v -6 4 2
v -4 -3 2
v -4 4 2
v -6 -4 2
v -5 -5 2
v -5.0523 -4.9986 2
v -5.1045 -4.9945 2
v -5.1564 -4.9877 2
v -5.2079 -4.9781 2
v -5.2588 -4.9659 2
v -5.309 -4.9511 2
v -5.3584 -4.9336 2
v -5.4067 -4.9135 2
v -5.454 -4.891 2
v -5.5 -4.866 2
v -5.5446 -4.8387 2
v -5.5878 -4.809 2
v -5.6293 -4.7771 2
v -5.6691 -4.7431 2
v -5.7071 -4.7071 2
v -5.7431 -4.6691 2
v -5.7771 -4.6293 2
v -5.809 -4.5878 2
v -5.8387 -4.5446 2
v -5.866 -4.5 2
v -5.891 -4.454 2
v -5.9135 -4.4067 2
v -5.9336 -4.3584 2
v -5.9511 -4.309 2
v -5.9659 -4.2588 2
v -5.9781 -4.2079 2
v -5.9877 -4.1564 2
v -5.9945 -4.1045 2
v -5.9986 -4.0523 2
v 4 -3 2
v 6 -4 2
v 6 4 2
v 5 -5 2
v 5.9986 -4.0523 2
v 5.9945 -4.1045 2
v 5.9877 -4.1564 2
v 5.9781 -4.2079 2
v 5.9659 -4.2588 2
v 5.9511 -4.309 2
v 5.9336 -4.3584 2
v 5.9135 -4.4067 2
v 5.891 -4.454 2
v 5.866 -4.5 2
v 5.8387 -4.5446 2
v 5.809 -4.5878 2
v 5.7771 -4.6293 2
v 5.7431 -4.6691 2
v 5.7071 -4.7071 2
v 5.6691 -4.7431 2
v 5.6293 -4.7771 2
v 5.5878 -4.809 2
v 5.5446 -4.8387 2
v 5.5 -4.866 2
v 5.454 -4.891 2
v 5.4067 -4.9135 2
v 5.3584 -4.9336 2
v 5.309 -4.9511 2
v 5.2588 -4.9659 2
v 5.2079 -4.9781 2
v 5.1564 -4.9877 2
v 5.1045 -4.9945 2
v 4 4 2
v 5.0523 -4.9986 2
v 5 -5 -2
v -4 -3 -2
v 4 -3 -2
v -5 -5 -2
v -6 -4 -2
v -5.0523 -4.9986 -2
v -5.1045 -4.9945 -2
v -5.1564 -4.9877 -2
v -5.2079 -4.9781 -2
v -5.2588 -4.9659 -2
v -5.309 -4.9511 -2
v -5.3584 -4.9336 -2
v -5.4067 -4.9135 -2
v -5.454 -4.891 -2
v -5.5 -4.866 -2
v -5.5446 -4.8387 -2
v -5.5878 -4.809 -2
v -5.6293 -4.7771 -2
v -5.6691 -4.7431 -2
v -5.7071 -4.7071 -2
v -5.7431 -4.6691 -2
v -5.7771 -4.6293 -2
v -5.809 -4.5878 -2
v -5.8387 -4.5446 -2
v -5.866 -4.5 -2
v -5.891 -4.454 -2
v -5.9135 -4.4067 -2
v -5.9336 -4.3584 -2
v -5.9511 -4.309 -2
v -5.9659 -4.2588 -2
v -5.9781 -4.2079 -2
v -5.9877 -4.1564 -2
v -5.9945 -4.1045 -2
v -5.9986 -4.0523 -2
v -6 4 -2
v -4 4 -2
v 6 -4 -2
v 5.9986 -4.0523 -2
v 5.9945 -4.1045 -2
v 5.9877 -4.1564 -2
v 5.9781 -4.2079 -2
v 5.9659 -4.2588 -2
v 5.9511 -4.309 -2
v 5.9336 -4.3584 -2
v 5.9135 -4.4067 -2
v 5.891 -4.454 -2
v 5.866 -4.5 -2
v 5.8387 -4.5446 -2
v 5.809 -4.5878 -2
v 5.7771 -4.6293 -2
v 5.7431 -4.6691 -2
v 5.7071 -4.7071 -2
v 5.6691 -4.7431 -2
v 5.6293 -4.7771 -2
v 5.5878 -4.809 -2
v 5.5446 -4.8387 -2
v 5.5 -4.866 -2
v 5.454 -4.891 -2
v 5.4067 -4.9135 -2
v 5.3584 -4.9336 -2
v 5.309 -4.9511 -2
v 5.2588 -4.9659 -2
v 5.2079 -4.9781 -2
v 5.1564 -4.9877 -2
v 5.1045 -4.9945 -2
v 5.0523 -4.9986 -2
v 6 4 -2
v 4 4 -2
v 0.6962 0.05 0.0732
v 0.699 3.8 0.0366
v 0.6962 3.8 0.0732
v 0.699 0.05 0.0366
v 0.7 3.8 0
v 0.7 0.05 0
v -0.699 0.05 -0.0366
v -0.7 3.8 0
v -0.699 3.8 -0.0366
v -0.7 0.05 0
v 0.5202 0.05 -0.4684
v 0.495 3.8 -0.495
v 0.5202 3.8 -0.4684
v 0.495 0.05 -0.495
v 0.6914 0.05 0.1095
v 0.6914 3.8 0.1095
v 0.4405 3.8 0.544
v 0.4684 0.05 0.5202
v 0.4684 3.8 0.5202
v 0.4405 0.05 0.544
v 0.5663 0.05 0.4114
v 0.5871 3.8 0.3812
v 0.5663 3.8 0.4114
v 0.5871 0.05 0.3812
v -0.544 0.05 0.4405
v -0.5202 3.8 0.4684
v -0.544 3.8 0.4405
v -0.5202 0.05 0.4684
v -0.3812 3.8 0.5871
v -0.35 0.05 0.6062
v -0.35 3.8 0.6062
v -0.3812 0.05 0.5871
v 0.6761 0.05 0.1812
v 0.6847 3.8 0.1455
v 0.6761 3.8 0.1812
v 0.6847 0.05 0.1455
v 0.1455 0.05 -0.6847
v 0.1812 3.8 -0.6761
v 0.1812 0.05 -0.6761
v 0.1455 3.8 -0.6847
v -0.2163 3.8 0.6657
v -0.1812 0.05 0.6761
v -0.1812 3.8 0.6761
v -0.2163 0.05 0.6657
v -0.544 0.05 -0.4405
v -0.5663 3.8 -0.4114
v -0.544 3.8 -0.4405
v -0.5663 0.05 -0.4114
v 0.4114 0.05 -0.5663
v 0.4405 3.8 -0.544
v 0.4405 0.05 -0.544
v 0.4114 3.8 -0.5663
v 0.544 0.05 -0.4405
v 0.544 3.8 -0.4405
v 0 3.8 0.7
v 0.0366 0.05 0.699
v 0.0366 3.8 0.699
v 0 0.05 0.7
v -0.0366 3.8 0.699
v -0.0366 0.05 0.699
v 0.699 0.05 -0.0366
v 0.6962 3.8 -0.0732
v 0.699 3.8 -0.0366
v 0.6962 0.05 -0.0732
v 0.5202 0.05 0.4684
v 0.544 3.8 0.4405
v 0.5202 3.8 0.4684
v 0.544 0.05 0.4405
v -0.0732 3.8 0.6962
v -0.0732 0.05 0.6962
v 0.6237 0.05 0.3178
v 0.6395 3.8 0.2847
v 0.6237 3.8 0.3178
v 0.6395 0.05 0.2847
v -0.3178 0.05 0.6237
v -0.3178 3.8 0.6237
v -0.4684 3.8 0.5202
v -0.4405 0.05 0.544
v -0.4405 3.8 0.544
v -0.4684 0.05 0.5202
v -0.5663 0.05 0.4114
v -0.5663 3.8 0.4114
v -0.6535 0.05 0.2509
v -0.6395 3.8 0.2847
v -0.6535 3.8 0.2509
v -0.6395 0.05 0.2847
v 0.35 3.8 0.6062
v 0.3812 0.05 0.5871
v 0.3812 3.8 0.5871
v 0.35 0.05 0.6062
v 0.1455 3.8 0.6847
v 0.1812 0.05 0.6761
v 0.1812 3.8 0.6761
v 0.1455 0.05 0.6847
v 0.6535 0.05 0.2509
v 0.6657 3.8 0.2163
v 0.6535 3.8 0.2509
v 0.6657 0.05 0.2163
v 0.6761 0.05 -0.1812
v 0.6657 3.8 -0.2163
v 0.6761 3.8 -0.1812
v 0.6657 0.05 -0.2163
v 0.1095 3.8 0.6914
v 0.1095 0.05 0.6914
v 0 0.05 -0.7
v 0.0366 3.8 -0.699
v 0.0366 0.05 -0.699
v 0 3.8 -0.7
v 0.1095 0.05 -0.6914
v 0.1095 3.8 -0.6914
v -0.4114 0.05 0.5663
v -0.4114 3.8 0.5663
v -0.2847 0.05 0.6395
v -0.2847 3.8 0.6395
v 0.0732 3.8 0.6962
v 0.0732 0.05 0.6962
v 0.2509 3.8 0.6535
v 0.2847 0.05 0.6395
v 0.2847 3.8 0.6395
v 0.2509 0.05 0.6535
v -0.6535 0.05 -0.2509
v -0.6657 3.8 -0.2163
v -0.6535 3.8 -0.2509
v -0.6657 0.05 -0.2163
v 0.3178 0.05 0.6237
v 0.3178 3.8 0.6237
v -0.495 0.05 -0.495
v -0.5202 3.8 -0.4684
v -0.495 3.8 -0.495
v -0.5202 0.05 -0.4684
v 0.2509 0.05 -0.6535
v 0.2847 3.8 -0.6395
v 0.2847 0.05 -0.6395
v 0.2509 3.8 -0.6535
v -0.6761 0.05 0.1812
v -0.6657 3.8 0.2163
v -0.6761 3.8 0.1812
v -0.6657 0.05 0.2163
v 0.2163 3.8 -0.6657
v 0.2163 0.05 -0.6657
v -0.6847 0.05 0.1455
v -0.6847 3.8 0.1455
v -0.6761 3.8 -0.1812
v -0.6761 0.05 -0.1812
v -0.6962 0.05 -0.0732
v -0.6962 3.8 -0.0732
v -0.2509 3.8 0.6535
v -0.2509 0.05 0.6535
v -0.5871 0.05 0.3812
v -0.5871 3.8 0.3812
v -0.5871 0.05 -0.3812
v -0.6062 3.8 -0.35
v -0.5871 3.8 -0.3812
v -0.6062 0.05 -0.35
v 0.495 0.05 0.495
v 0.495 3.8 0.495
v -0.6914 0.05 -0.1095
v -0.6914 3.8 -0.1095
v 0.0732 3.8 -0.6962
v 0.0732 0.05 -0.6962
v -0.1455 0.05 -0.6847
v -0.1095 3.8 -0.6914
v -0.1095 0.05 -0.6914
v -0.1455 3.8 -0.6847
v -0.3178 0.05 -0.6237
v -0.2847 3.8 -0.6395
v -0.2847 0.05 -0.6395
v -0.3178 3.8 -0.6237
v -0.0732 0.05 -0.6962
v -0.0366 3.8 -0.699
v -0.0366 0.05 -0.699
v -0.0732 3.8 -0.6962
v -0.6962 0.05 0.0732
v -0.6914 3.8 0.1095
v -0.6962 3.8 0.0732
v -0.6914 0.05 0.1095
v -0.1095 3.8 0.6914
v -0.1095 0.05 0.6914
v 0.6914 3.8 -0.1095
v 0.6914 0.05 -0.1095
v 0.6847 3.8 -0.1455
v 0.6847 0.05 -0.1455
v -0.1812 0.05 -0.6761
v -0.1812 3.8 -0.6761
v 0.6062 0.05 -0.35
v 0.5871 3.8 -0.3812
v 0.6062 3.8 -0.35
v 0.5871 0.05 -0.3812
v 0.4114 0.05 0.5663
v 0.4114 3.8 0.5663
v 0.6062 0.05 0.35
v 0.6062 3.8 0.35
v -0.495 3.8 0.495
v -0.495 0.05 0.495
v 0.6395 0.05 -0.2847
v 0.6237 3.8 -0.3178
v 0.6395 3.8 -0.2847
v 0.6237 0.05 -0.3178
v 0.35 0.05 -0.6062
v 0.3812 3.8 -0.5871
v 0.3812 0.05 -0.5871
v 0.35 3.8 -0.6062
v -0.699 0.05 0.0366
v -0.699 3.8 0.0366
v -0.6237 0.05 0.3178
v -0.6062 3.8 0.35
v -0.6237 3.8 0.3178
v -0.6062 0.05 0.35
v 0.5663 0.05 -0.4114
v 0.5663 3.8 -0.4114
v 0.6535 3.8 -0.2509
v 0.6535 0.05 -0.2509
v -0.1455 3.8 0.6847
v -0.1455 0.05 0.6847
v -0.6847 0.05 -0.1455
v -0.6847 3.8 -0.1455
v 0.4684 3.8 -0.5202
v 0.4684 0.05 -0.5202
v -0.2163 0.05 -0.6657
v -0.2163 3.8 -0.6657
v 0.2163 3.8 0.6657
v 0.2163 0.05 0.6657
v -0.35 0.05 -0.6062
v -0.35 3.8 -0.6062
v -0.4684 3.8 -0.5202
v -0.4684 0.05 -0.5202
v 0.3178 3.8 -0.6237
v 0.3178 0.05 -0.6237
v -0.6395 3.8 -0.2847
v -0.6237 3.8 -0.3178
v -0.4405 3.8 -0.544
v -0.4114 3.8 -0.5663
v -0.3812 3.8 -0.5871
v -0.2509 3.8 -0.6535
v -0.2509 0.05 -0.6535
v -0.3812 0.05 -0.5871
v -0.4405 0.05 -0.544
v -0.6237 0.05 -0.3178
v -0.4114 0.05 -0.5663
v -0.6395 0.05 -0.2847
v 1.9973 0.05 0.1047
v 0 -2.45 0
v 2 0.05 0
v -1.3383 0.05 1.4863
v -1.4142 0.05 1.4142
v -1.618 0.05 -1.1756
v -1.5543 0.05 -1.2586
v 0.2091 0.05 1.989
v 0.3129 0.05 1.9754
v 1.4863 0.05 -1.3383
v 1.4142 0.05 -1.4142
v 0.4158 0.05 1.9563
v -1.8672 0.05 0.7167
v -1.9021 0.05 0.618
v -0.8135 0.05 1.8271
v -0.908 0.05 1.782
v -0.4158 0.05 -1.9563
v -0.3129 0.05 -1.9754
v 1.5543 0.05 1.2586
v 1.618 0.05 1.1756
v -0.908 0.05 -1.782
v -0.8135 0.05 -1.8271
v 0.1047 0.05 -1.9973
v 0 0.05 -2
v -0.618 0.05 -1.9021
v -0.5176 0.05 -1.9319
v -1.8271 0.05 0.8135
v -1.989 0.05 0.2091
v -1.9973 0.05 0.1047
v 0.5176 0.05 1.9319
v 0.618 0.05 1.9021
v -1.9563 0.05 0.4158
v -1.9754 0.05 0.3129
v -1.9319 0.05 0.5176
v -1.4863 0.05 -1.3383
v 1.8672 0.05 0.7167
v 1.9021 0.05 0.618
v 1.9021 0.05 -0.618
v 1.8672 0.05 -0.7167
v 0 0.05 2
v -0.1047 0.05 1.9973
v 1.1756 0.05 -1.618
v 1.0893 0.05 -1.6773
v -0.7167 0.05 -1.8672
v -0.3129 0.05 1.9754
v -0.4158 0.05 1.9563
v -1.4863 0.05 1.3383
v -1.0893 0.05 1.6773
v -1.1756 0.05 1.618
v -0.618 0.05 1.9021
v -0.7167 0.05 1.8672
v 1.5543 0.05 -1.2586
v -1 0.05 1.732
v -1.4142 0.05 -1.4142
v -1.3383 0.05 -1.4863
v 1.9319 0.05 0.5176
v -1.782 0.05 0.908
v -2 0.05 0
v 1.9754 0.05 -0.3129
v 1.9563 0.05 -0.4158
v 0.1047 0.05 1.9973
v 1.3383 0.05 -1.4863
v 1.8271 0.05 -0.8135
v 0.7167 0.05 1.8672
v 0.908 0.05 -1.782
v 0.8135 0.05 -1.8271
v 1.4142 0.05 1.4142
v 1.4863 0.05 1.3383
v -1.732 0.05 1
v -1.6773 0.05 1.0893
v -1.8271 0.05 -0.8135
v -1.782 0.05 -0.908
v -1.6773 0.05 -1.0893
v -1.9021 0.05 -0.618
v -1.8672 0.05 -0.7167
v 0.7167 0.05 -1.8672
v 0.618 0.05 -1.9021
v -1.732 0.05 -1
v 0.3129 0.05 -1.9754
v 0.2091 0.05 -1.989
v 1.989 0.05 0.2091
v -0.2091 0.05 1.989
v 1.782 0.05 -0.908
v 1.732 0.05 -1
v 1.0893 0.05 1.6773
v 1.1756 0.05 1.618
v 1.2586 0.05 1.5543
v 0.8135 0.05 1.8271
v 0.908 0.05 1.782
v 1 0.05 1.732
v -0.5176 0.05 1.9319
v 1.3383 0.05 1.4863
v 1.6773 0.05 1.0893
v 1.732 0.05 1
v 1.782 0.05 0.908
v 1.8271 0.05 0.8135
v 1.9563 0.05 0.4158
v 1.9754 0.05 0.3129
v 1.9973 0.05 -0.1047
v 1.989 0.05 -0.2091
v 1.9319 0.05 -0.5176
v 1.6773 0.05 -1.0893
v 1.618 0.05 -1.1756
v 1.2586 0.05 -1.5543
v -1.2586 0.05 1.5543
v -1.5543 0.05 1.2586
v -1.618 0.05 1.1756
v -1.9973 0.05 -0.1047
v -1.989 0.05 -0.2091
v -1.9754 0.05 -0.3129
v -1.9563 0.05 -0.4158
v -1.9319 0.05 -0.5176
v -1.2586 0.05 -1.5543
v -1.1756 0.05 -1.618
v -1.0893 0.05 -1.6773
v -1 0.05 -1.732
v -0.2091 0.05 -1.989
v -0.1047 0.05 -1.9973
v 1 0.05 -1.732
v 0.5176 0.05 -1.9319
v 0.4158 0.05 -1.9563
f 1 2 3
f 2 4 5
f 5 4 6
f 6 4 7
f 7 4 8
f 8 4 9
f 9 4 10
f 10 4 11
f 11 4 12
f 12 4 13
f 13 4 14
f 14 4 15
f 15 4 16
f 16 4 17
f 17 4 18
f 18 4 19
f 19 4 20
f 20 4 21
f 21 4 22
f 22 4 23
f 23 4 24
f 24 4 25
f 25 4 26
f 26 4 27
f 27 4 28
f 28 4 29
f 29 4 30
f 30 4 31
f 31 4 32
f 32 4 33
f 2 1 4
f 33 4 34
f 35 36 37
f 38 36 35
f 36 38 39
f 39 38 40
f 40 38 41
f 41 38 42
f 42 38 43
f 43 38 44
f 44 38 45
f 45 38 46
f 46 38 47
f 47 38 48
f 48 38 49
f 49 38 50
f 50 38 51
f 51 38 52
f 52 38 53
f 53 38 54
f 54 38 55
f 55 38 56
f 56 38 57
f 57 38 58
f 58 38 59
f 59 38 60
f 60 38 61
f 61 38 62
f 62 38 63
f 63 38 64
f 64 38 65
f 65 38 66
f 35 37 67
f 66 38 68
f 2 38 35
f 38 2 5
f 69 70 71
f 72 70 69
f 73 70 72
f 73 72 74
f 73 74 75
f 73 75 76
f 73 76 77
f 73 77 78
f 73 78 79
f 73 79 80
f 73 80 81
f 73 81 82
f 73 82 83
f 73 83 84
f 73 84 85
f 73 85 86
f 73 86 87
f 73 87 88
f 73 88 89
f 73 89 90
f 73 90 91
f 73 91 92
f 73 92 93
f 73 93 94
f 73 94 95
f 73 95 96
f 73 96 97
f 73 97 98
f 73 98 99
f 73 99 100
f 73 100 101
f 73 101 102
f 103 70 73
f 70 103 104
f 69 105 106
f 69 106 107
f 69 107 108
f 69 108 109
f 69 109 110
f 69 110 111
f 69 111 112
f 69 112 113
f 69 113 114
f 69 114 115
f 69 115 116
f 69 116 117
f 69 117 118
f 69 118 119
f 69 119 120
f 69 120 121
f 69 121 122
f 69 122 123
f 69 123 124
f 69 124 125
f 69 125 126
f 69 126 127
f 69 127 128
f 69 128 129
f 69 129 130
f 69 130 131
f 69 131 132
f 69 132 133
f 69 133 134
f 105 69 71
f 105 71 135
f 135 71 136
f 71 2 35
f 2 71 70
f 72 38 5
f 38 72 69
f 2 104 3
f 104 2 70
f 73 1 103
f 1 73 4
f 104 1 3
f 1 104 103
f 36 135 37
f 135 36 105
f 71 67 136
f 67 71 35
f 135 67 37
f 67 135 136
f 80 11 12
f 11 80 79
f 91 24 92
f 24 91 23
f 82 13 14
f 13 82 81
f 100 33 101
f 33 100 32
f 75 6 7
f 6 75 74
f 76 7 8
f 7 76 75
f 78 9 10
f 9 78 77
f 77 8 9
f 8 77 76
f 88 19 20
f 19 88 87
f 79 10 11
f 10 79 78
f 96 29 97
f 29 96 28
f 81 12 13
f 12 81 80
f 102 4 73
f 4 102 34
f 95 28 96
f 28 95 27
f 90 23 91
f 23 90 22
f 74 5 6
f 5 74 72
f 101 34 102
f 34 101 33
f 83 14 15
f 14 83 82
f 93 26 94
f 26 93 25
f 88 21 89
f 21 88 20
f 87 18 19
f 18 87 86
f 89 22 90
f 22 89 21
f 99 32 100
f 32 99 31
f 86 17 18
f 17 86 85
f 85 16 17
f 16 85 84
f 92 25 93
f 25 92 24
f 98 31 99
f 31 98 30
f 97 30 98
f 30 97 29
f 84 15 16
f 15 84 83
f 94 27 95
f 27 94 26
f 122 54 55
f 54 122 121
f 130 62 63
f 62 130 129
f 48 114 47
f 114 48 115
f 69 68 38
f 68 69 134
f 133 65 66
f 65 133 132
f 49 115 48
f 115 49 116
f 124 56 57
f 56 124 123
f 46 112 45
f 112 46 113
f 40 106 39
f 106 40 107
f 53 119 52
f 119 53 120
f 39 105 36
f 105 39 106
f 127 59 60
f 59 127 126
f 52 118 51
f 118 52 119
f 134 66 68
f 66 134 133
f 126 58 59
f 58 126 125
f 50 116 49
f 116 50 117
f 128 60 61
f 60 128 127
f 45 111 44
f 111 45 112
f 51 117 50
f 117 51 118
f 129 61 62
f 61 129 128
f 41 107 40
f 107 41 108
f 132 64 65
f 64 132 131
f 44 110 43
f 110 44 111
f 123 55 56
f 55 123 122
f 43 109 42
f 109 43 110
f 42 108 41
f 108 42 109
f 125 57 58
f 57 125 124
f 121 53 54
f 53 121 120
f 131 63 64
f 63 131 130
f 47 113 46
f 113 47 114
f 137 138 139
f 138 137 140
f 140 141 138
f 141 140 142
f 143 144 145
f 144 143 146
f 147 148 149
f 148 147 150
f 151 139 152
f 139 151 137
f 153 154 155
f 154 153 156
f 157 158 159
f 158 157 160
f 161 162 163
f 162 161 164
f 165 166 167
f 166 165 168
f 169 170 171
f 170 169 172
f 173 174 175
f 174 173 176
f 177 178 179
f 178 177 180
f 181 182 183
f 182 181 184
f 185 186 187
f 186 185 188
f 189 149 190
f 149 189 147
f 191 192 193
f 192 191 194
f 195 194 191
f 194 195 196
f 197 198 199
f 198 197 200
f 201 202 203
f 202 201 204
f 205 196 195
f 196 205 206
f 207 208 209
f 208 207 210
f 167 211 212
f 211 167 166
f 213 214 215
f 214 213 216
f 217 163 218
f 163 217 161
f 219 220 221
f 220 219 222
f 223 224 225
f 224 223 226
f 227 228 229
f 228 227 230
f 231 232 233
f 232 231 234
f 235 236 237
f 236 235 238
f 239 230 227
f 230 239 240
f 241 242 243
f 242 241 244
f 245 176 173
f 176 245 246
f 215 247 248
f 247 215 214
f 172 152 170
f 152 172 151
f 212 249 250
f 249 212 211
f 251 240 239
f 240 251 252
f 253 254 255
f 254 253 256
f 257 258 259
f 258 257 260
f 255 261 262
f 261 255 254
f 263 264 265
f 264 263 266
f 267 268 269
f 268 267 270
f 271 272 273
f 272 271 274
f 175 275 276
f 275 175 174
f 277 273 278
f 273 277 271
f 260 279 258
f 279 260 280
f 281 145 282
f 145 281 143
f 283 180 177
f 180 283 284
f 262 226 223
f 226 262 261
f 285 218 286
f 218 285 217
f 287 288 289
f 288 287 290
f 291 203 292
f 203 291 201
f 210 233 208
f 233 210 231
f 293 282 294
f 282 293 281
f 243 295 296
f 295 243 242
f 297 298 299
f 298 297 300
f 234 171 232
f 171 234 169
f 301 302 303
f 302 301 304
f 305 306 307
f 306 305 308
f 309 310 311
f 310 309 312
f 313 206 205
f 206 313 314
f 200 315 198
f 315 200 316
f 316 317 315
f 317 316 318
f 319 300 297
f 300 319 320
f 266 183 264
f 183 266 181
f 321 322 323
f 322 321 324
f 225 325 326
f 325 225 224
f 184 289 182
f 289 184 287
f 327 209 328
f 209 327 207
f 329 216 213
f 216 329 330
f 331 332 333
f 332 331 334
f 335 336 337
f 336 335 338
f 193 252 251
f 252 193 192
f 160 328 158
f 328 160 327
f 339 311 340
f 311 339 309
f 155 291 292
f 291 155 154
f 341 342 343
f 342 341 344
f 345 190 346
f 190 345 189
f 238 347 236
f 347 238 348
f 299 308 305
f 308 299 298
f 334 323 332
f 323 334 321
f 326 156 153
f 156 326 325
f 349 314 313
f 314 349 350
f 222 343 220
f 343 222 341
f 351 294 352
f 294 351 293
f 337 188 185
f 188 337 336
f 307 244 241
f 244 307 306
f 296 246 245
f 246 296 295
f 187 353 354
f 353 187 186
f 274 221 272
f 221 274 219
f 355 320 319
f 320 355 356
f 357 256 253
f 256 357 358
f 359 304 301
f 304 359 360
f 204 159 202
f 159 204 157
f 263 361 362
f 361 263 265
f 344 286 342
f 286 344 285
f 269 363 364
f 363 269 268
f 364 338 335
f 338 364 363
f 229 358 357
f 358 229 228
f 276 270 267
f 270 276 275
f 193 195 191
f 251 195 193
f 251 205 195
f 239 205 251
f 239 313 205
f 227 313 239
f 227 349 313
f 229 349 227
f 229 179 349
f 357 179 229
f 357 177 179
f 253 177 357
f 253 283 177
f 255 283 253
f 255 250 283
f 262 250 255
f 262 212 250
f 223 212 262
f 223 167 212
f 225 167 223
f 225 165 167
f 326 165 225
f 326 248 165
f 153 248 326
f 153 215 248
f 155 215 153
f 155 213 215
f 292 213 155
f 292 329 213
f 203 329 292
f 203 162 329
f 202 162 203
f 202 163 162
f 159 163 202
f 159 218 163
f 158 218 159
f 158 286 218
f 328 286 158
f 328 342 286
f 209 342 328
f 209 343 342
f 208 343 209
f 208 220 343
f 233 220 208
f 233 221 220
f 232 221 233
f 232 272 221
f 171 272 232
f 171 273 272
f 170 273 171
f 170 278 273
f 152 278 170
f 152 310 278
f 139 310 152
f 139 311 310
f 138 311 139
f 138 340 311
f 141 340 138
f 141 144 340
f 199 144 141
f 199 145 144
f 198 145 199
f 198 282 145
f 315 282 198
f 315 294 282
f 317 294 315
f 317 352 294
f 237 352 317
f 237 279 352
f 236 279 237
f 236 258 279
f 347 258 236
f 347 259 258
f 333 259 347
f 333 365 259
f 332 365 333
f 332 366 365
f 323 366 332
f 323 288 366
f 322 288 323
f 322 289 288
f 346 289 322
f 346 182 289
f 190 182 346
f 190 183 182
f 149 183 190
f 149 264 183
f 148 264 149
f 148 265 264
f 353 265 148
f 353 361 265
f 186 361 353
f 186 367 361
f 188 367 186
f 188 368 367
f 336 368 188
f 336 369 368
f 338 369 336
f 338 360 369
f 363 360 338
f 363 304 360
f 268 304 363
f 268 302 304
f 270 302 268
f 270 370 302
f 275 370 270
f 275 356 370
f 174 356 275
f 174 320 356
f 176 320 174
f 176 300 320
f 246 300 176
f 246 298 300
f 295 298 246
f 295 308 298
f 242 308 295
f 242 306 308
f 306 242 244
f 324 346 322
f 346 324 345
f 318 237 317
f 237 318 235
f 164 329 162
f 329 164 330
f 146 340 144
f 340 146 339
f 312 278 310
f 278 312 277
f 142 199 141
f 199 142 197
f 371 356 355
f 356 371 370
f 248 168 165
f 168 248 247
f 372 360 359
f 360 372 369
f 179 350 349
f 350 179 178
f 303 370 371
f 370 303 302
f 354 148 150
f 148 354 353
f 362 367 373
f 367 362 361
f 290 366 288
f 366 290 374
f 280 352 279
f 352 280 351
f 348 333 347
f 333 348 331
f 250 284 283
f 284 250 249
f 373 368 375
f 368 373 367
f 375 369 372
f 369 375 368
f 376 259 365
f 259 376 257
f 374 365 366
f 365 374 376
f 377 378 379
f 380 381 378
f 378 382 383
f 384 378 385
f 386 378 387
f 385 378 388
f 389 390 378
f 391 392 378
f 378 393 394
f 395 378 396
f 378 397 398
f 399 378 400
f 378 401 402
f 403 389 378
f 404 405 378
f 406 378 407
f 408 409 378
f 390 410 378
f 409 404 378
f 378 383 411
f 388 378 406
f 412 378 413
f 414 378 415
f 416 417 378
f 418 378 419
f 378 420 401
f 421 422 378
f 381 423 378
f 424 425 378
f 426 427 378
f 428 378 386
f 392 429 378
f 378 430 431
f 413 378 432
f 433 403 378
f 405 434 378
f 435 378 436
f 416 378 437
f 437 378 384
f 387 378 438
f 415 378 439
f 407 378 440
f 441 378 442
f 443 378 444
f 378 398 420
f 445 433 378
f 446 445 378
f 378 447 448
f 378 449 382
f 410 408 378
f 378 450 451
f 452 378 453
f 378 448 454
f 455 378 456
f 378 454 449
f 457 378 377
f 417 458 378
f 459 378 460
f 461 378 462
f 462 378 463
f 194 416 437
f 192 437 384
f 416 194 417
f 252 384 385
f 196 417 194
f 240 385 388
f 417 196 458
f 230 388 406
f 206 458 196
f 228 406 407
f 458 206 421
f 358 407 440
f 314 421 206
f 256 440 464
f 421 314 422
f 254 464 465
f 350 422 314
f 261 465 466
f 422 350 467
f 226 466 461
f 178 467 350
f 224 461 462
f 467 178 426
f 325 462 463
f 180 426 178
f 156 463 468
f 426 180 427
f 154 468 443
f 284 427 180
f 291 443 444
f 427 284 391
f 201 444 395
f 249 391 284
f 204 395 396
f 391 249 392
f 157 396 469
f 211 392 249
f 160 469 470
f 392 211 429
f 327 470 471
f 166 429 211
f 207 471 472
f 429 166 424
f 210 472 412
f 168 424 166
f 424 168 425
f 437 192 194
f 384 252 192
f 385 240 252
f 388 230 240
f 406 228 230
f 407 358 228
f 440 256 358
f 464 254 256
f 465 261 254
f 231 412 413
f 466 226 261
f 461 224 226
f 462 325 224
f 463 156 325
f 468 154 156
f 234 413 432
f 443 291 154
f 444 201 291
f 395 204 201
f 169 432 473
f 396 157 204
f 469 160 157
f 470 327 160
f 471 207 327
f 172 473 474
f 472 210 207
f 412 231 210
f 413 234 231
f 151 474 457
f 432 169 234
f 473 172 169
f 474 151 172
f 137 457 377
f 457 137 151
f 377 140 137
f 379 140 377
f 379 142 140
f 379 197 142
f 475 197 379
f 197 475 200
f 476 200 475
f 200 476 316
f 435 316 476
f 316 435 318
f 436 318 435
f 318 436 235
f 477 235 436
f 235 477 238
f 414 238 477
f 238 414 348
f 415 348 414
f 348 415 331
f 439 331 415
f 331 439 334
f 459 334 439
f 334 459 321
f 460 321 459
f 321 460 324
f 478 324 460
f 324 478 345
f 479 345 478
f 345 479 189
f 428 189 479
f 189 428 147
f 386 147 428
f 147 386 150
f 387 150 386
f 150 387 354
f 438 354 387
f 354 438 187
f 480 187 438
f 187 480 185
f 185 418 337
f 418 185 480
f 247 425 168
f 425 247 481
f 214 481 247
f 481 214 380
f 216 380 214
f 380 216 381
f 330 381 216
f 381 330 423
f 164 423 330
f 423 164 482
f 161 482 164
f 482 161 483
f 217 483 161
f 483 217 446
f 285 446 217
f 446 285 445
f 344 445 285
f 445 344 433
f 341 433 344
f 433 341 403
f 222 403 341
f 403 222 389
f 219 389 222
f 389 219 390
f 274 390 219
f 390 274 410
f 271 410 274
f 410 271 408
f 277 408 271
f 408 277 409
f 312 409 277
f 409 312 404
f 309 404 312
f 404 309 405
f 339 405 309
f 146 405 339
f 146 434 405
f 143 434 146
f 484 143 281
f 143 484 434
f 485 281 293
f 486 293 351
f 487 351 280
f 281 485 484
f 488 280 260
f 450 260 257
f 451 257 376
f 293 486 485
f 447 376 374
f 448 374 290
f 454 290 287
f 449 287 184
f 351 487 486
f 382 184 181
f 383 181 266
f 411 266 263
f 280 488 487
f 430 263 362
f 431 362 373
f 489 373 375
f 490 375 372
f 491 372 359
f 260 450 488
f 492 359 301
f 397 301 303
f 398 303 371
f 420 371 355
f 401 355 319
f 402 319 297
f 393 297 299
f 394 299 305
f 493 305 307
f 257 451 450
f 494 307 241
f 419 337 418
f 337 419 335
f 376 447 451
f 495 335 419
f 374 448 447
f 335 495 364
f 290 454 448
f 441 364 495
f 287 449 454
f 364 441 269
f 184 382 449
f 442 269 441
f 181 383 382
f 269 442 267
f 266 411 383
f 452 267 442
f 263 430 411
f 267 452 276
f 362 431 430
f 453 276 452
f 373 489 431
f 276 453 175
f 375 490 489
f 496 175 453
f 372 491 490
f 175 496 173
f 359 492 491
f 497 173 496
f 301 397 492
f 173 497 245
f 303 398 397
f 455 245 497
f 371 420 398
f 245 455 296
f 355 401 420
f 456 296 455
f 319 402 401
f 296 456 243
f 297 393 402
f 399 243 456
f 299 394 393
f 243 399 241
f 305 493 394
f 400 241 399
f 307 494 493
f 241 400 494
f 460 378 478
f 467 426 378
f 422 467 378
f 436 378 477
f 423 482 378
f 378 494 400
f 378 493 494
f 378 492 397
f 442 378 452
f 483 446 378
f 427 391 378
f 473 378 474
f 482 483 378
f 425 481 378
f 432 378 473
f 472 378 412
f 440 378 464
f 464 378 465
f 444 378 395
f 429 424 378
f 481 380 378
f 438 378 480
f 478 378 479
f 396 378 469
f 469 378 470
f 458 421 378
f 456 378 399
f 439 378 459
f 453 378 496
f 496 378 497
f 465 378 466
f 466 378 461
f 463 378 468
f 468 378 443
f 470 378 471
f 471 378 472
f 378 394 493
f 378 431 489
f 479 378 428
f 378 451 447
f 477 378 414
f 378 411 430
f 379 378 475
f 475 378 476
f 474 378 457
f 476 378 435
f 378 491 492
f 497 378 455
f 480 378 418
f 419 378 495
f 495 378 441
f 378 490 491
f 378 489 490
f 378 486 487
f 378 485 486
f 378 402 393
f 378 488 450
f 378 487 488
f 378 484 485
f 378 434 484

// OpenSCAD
//=============================================================================
// 3D icon used for ImportModel in MakerVR.
// =============================================================================

module ImportModel() {
     w = 10;
     h =  8;
     t =  2;
     d =  4;
     module _Bottom() {
          translate([0, -h/2, 0]) cube([w, t, d], center = true);
          translate([-w/2, 0, 0]) cube([t, h, d], center = true);
          translate([ w/2, 0, 0]) cube([t, h, d], center = true);
          translate([-w/2, -h/2, 0]) cylinder(d=t, h=d, center = true);
          translate([ w/2, -h/2, 0]) cylinder(d=t, h=d, center = true);
     }
     module _Arrow() {
          rotate([90, 0, 0]) cylinder(r=.7, h=4, center = true);
          translate([0, -3, 0]) rotate([90, 0, 0])
               cylinder(d1=d, d2=0, h=2.5, center = true);
     }
     _Bottom();
     translate([0, 1.8, 0]) _Arrow();
}

ImportModel($fn = 120);
